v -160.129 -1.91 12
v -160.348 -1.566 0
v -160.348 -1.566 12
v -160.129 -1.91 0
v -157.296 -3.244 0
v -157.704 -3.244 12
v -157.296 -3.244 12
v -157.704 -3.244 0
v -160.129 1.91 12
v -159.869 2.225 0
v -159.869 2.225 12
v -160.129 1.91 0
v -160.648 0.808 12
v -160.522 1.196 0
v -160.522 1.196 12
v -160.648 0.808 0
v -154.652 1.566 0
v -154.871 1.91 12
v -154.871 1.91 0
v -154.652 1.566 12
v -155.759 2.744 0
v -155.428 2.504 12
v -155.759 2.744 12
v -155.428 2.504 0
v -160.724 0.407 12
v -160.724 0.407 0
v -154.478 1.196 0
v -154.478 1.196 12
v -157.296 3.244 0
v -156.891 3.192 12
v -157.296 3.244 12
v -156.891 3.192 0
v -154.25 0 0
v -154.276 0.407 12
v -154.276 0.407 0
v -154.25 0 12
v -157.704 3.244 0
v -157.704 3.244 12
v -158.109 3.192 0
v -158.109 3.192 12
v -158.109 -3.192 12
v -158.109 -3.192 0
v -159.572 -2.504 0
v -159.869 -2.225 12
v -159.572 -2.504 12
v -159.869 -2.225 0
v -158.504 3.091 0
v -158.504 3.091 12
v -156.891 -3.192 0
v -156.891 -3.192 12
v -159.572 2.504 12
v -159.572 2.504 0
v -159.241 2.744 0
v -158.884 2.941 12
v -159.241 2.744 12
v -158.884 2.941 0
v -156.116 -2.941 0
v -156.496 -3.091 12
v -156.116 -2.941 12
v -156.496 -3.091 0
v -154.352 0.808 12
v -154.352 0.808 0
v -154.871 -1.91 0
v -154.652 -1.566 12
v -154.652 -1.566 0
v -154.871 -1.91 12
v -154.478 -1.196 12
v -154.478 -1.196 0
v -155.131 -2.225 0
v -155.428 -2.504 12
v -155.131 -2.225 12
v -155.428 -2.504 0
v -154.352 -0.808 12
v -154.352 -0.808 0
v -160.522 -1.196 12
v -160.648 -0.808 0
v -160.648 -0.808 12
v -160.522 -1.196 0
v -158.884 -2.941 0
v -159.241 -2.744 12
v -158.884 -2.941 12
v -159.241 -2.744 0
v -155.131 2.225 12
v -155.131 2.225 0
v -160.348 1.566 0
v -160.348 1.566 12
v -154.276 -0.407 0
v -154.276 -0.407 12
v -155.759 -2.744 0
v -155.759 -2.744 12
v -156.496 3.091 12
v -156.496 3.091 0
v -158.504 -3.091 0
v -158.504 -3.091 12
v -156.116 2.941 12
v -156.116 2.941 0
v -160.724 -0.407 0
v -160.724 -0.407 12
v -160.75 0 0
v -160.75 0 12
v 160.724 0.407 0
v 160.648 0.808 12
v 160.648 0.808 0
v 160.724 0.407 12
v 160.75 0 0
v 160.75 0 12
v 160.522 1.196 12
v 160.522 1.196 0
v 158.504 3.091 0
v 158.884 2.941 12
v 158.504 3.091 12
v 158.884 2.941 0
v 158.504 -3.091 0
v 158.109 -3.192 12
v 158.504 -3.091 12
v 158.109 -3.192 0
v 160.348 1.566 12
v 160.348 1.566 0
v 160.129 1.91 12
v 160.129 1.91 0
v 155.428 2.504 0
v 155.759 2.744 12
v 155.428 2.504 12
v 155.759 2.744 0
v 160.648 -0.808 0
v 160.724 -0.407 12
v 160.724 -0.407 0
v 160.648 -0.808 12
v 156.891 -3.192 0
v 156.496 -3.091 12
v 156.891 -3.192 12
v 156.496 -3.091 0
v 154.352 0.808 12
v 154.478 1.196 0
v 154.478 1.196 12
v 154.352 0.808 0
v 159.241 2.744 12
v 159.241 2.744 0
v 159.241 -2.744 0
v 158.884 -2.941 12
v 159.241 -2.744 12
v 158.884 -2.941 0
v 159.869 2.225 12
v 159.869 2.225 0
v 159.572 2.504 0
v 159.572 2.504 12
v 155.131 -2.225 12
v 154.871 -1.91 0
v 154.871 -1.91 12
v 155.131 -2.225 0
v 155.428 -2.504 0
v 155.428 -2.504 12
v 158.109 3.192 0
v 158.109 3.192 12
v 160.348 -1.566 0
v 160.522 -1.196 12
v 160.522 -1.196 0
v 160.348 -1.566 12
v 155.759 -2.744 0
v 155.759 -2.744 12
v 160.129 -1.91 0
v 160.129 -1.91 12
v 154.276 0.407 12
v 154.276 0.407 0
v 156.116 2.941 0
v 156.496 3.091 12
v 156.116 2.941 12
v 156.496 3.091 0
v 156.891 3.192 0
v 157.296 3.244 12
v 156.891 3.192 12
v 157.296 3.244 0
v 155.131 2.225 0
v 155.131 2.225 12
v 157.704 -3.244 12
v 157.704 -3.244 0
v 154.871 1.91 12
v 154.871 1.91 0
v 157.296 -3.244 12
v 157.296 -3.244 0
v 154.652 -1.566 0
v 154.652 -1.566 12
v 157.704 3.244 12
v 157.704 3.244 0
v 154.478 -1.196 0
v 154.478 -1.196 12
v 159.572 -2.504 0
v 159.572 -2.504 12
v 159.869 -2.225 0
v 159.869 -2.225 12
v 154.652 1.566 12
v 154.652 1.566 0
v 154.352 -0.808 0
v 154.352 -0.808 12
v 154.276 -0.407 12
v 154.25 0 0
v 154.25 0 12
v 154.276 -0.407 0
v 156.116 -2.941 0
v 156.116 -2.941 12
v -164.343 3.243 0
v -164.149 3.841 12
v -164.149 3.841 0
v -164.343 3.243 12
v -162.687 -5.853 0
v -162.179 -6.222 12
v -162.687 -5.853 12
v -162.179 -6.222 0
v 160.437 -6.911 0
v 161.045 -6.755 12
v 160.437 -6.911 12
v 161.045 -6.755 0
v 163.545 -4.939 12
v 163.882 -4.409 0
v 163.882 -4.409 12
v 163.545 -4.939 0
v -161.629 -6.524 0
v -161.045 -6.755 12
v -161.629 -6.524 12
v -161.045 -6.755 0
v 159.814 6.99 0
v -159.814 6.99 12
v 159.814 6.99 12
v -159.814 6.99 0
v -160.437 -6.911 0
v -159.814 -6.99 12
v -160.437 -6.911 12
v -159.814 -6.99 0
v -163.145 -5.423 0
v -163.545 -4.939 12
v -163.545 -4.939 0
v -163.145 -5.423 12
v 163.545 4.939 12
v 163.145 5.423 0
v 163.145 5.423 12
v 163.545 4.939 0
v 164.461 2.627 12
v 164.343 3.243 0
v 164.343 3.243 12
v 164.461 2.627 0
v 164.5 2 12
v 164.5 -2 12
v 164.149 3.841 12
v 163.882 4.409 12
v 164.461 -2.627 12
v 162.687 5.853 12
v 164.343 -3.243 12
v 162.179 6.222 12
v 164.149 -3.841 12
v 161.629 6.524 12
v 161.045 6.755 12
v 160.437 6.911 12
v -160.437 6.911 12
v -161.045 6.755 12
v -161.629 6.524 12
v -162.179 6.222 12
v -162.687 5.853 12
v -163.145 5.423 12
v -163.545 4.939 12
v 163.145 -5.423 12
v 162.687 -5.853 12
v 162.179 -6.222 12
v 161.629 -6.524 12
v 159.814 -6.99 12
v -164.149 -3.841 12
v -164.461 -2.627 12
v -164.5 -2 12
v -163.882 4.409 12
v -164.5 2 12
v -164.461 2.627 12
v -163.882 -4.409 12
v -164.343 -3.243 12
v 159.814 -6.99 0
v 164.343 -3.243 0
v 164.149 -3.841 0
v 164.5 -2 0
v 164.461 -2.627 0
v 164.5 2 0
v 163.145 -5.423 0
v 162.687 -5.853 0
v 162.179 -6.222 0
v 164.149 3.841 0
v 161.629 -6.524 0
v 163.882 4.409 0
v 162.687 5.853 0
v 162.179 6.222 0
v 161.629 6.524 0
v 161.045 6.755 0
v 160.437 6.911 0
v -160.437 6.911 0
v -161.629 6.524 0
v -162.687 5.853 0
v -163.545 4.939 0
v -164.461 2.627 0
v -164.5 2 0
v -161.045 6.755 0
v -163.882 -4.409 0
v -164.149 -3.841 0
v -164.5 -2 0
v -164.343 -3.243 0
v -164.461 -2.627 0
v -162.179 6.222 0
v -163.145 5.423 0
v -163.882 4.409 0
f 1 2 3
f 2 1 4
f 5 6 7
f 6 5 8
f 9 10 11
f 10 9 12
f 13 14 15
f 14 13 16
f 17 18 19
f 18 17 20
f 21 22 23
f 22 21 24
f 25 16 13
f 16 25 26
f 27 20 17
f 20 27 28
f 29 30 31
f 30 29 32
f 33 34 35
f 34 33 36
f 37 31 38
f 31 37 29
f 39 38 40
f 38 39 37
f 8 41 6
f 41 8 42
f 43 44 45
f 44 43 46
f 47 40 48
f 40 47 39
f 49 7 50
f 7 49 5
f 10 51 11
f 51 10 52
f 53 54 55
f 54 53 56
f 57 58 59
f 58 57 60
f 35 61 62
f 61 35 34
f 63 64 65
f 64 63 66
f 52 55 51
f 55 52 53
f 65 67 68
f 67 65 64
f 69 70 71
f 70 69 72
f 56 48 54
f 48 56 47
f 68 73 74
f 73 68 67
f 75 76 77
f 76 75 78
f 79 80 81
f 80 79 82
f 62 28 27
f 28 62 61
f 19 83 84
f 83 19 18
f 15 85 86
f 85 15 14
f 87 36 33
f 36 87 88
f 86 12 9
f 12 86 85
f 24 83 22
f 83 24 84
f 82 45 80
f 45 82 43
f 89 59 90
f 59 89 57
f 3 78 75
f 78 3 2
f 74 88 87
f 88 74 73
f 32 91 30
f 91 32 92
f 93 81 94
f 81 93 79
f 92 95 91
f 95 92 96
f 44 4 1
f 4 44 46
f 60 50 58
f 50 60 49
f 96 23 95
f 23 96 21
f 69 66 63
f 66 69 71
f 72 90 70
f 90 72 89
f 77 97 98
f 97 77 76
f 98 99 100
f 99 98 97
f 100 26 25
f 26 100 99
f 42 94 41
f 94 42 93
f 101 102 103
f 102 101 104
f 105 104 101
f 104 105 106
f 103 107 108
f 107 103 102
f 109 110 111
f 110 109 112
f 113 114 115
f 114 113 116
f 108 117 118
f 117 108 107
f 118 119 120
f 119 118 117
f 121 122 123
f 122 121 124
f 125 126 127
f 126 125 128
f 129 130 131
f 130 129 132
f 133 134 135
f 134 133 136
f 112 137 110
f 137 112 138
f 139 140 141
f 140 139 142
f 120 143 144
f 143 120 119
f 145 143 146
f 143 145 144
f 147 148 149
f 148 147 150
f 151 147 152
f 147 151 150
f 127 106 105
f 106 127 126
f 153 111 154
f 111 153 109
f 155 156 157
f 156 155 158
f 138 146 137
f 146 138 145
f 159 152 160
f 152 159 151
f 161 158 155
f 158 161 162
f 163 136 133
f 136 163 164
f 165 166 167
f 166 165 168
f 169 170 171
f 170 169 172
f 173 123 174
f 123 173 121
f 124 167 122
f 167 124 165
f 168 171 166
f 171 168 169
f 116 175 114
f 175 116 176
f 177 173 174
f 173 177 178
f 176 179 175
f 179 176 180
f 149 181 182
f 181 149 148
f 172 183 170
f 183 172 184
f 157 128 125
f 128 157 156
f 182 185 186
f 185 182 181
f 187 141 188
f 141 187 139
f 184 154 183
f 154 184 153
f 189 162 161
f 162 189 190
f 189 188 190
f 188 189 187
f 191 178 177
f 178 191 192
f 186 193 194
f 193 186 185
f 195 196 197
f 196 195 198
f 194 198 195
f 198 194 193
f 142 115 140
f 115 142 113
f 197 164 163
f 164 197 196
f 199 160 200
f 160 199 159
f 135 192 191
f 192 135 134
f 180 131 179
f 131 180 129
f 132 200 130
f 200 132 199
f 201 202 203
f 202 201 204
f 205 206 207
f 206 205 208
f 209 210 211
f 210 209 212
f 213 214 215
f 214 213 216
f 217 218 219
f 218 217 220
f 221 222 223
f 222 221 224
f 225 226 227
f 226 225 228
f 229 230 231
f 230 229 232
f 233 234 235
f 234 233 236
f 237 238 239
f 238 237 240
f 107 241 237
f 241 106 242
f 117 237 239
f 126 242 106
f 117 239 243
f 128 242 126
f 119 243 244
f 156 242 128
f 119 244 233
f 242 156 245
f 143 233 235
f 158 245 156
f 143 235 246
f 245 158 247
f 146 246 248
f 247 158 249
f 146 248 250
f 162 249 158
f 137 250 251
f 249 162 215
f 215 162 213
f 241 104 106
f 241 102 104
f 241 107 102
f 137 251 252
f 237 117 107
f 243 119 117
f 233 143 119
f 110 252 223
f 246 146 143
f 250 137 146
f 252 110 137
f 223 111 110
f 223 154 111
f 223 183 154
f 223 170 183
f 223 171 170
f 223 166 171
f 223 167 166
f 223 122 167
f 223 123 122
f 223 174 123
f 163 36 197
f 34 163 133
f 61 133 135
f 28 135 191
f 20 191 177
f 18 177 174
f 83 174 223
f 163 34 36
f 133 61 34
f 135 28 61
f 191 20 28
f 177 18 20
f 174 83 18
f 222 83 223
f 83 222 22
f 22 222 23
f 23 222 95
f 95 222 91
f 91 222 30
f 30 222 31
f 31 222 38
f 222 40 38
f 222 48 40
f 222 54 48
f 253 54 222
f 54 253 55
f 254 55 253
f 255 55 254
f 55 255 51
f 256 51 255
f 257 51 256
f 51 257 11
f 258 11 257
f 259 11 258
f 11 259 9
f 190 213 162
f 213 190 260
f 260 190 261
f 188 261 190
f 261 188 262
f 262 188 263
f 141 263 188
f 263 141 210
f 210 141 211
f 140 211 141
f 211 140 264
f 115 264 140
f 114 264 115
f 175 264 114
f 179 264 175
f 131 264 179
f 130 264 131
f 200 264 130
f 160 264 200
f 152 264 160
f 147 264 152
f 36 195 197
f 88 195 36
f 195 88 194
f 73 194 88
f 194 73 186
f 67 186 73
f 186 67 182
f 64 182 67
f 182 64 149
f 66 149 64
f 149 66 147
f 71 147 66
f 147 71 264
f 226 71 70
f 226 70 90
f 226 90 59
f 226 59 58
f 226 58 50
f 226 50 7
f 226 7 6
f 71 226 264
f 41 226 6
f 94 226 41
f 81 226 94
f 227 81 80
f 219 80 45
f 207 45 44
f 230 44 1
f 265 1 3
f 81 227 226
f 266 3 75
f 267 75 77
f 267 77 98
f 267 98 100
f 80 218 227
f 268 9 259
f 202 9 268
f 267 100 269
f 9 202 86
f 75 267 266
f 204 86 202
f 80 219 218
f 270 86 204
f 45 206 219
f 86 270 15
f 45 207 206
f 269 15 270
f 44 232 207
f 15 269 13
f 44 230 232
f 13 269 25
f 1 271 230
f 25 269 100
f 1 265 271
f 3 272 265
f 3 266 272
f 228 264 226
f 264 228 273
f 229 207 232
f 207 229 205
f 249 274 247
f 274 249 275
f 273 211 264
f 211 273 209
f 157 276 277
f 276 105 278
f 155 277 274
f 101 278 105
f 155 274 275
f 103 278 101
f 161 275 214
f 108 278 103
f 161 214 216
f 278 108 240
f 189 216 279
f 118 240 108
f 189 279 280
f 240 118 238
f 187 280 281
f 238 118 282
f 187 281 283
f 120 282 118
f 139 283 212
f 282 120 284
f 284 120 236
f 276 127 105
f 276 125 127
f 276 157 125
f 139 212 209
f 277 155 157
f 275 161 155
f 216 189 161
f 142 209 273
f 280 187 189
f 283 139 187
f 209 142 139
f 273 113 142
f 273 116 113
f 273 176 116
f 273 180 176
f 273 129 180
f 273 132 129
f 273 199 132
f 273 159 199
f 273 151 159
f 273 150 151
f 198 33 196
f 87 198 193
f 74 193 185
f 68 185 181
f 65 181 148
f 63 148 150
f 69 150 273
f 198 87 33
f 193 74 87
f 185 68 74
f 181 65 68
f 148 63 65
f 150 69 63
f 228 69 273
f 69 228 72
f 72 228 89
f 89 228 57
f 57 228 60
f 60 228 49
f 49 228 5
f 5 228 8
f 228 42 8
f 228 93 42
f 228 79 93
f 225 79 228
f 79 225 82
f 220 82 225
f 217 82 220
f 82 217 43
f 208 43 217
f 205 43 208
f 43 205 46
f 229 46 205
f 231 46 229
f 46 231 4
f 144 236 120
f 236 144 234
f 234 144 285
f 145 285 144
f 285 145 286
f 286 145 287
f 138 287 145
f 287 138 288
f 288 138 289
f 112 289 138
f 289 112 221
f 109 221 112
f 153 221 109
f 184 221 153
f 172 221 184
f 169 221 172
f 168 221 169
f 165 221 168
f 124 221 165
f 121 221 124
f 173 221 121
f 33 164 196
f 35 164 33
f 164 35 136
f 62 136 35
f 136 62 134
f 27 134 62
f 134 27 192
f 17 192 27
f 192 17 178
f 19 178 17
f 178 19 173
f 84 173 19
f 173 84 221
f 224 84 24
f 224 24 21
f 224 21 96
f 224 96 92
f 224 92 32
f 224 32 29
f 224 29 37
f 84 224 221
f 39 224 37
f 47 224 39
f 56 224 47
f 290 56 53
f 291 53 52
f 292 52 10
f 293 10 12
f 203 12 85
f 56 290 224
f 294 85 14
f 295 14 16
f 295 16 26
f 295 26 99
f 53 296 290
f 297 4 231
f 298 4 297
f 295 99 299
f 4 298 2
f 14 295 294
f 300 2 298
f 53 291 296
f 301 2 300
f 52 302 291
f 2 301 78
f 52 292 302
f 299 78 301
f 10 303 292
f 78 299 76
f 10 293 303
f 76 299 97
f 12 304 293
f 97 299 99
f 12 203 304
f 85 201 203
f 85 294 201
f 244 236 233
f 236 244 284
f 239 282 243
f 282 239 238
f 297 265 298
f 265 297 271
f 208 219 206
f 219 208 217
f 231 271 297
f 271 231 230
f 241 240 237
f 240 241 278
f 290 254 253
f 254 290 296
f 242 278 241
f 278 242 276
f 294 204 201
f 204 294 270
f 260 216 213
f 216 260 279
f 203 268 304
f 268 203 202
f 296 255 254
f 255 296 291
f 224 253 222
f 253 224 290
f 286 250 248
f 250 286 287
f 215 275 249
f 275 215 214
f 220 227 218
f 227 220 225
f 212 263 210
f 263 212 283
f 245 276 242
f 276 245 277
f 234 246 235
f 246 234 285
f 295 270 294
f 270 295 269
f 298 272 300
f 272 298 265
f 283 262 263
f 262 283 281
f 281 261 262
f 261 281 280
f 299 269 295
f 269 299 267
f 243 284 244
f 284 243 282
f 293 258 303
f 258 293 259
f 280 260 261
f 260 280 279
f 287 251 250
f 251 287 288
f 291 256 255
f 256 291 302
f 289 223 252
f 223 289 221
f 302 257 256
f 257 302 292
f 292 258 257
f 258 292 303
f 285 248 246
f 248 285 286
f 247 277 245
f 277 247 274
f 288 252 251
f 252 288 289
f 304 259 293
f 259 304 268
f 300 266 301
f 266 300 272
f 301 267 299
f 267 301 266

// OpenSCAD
$fn = 50;


difference() {
	union() {
		hull() {
			translate(v = [-159.5000000000, 2.0000000000, 0]) {
				cylinder(h = 12, r = 5);
			}
			translate(v = [159.5000000000, 2.0000000000, 0]) {
				cylinder(h = 12, r = 5);
			}
			translate(v = [-159.5000000000, -2.0000000000, 0]) {
				cylinder(h = 12, r = 5);
			}
			translate(v = [159.5000000000, -2.0000000000, 0]) {
				cylinder(h = 12, r = 5);
			}
		}
	}
	union() {
		translate(v = [-157.5000000000, 0.0000000000, -100.0000000000]) {
			cylinder(h = 200, r = 3.2500000000);
		}
		translate(v = [-157.5000000000, 0.0000000000, -100.0000000000]) {
			cylinder(h = 200, r = 3.2500000000);
		}
		translate(v = [157.5000000000, 0.0000000000, -100.0000000000]) {
			cylinder(h = 200, r = 3.2500000000);
		}
		translate(v = [157.5000000000, 0.0000000000, -100.0000000000]) {
			cylinder(h = 200, r = 3.2500000000);
		}
	}
}
